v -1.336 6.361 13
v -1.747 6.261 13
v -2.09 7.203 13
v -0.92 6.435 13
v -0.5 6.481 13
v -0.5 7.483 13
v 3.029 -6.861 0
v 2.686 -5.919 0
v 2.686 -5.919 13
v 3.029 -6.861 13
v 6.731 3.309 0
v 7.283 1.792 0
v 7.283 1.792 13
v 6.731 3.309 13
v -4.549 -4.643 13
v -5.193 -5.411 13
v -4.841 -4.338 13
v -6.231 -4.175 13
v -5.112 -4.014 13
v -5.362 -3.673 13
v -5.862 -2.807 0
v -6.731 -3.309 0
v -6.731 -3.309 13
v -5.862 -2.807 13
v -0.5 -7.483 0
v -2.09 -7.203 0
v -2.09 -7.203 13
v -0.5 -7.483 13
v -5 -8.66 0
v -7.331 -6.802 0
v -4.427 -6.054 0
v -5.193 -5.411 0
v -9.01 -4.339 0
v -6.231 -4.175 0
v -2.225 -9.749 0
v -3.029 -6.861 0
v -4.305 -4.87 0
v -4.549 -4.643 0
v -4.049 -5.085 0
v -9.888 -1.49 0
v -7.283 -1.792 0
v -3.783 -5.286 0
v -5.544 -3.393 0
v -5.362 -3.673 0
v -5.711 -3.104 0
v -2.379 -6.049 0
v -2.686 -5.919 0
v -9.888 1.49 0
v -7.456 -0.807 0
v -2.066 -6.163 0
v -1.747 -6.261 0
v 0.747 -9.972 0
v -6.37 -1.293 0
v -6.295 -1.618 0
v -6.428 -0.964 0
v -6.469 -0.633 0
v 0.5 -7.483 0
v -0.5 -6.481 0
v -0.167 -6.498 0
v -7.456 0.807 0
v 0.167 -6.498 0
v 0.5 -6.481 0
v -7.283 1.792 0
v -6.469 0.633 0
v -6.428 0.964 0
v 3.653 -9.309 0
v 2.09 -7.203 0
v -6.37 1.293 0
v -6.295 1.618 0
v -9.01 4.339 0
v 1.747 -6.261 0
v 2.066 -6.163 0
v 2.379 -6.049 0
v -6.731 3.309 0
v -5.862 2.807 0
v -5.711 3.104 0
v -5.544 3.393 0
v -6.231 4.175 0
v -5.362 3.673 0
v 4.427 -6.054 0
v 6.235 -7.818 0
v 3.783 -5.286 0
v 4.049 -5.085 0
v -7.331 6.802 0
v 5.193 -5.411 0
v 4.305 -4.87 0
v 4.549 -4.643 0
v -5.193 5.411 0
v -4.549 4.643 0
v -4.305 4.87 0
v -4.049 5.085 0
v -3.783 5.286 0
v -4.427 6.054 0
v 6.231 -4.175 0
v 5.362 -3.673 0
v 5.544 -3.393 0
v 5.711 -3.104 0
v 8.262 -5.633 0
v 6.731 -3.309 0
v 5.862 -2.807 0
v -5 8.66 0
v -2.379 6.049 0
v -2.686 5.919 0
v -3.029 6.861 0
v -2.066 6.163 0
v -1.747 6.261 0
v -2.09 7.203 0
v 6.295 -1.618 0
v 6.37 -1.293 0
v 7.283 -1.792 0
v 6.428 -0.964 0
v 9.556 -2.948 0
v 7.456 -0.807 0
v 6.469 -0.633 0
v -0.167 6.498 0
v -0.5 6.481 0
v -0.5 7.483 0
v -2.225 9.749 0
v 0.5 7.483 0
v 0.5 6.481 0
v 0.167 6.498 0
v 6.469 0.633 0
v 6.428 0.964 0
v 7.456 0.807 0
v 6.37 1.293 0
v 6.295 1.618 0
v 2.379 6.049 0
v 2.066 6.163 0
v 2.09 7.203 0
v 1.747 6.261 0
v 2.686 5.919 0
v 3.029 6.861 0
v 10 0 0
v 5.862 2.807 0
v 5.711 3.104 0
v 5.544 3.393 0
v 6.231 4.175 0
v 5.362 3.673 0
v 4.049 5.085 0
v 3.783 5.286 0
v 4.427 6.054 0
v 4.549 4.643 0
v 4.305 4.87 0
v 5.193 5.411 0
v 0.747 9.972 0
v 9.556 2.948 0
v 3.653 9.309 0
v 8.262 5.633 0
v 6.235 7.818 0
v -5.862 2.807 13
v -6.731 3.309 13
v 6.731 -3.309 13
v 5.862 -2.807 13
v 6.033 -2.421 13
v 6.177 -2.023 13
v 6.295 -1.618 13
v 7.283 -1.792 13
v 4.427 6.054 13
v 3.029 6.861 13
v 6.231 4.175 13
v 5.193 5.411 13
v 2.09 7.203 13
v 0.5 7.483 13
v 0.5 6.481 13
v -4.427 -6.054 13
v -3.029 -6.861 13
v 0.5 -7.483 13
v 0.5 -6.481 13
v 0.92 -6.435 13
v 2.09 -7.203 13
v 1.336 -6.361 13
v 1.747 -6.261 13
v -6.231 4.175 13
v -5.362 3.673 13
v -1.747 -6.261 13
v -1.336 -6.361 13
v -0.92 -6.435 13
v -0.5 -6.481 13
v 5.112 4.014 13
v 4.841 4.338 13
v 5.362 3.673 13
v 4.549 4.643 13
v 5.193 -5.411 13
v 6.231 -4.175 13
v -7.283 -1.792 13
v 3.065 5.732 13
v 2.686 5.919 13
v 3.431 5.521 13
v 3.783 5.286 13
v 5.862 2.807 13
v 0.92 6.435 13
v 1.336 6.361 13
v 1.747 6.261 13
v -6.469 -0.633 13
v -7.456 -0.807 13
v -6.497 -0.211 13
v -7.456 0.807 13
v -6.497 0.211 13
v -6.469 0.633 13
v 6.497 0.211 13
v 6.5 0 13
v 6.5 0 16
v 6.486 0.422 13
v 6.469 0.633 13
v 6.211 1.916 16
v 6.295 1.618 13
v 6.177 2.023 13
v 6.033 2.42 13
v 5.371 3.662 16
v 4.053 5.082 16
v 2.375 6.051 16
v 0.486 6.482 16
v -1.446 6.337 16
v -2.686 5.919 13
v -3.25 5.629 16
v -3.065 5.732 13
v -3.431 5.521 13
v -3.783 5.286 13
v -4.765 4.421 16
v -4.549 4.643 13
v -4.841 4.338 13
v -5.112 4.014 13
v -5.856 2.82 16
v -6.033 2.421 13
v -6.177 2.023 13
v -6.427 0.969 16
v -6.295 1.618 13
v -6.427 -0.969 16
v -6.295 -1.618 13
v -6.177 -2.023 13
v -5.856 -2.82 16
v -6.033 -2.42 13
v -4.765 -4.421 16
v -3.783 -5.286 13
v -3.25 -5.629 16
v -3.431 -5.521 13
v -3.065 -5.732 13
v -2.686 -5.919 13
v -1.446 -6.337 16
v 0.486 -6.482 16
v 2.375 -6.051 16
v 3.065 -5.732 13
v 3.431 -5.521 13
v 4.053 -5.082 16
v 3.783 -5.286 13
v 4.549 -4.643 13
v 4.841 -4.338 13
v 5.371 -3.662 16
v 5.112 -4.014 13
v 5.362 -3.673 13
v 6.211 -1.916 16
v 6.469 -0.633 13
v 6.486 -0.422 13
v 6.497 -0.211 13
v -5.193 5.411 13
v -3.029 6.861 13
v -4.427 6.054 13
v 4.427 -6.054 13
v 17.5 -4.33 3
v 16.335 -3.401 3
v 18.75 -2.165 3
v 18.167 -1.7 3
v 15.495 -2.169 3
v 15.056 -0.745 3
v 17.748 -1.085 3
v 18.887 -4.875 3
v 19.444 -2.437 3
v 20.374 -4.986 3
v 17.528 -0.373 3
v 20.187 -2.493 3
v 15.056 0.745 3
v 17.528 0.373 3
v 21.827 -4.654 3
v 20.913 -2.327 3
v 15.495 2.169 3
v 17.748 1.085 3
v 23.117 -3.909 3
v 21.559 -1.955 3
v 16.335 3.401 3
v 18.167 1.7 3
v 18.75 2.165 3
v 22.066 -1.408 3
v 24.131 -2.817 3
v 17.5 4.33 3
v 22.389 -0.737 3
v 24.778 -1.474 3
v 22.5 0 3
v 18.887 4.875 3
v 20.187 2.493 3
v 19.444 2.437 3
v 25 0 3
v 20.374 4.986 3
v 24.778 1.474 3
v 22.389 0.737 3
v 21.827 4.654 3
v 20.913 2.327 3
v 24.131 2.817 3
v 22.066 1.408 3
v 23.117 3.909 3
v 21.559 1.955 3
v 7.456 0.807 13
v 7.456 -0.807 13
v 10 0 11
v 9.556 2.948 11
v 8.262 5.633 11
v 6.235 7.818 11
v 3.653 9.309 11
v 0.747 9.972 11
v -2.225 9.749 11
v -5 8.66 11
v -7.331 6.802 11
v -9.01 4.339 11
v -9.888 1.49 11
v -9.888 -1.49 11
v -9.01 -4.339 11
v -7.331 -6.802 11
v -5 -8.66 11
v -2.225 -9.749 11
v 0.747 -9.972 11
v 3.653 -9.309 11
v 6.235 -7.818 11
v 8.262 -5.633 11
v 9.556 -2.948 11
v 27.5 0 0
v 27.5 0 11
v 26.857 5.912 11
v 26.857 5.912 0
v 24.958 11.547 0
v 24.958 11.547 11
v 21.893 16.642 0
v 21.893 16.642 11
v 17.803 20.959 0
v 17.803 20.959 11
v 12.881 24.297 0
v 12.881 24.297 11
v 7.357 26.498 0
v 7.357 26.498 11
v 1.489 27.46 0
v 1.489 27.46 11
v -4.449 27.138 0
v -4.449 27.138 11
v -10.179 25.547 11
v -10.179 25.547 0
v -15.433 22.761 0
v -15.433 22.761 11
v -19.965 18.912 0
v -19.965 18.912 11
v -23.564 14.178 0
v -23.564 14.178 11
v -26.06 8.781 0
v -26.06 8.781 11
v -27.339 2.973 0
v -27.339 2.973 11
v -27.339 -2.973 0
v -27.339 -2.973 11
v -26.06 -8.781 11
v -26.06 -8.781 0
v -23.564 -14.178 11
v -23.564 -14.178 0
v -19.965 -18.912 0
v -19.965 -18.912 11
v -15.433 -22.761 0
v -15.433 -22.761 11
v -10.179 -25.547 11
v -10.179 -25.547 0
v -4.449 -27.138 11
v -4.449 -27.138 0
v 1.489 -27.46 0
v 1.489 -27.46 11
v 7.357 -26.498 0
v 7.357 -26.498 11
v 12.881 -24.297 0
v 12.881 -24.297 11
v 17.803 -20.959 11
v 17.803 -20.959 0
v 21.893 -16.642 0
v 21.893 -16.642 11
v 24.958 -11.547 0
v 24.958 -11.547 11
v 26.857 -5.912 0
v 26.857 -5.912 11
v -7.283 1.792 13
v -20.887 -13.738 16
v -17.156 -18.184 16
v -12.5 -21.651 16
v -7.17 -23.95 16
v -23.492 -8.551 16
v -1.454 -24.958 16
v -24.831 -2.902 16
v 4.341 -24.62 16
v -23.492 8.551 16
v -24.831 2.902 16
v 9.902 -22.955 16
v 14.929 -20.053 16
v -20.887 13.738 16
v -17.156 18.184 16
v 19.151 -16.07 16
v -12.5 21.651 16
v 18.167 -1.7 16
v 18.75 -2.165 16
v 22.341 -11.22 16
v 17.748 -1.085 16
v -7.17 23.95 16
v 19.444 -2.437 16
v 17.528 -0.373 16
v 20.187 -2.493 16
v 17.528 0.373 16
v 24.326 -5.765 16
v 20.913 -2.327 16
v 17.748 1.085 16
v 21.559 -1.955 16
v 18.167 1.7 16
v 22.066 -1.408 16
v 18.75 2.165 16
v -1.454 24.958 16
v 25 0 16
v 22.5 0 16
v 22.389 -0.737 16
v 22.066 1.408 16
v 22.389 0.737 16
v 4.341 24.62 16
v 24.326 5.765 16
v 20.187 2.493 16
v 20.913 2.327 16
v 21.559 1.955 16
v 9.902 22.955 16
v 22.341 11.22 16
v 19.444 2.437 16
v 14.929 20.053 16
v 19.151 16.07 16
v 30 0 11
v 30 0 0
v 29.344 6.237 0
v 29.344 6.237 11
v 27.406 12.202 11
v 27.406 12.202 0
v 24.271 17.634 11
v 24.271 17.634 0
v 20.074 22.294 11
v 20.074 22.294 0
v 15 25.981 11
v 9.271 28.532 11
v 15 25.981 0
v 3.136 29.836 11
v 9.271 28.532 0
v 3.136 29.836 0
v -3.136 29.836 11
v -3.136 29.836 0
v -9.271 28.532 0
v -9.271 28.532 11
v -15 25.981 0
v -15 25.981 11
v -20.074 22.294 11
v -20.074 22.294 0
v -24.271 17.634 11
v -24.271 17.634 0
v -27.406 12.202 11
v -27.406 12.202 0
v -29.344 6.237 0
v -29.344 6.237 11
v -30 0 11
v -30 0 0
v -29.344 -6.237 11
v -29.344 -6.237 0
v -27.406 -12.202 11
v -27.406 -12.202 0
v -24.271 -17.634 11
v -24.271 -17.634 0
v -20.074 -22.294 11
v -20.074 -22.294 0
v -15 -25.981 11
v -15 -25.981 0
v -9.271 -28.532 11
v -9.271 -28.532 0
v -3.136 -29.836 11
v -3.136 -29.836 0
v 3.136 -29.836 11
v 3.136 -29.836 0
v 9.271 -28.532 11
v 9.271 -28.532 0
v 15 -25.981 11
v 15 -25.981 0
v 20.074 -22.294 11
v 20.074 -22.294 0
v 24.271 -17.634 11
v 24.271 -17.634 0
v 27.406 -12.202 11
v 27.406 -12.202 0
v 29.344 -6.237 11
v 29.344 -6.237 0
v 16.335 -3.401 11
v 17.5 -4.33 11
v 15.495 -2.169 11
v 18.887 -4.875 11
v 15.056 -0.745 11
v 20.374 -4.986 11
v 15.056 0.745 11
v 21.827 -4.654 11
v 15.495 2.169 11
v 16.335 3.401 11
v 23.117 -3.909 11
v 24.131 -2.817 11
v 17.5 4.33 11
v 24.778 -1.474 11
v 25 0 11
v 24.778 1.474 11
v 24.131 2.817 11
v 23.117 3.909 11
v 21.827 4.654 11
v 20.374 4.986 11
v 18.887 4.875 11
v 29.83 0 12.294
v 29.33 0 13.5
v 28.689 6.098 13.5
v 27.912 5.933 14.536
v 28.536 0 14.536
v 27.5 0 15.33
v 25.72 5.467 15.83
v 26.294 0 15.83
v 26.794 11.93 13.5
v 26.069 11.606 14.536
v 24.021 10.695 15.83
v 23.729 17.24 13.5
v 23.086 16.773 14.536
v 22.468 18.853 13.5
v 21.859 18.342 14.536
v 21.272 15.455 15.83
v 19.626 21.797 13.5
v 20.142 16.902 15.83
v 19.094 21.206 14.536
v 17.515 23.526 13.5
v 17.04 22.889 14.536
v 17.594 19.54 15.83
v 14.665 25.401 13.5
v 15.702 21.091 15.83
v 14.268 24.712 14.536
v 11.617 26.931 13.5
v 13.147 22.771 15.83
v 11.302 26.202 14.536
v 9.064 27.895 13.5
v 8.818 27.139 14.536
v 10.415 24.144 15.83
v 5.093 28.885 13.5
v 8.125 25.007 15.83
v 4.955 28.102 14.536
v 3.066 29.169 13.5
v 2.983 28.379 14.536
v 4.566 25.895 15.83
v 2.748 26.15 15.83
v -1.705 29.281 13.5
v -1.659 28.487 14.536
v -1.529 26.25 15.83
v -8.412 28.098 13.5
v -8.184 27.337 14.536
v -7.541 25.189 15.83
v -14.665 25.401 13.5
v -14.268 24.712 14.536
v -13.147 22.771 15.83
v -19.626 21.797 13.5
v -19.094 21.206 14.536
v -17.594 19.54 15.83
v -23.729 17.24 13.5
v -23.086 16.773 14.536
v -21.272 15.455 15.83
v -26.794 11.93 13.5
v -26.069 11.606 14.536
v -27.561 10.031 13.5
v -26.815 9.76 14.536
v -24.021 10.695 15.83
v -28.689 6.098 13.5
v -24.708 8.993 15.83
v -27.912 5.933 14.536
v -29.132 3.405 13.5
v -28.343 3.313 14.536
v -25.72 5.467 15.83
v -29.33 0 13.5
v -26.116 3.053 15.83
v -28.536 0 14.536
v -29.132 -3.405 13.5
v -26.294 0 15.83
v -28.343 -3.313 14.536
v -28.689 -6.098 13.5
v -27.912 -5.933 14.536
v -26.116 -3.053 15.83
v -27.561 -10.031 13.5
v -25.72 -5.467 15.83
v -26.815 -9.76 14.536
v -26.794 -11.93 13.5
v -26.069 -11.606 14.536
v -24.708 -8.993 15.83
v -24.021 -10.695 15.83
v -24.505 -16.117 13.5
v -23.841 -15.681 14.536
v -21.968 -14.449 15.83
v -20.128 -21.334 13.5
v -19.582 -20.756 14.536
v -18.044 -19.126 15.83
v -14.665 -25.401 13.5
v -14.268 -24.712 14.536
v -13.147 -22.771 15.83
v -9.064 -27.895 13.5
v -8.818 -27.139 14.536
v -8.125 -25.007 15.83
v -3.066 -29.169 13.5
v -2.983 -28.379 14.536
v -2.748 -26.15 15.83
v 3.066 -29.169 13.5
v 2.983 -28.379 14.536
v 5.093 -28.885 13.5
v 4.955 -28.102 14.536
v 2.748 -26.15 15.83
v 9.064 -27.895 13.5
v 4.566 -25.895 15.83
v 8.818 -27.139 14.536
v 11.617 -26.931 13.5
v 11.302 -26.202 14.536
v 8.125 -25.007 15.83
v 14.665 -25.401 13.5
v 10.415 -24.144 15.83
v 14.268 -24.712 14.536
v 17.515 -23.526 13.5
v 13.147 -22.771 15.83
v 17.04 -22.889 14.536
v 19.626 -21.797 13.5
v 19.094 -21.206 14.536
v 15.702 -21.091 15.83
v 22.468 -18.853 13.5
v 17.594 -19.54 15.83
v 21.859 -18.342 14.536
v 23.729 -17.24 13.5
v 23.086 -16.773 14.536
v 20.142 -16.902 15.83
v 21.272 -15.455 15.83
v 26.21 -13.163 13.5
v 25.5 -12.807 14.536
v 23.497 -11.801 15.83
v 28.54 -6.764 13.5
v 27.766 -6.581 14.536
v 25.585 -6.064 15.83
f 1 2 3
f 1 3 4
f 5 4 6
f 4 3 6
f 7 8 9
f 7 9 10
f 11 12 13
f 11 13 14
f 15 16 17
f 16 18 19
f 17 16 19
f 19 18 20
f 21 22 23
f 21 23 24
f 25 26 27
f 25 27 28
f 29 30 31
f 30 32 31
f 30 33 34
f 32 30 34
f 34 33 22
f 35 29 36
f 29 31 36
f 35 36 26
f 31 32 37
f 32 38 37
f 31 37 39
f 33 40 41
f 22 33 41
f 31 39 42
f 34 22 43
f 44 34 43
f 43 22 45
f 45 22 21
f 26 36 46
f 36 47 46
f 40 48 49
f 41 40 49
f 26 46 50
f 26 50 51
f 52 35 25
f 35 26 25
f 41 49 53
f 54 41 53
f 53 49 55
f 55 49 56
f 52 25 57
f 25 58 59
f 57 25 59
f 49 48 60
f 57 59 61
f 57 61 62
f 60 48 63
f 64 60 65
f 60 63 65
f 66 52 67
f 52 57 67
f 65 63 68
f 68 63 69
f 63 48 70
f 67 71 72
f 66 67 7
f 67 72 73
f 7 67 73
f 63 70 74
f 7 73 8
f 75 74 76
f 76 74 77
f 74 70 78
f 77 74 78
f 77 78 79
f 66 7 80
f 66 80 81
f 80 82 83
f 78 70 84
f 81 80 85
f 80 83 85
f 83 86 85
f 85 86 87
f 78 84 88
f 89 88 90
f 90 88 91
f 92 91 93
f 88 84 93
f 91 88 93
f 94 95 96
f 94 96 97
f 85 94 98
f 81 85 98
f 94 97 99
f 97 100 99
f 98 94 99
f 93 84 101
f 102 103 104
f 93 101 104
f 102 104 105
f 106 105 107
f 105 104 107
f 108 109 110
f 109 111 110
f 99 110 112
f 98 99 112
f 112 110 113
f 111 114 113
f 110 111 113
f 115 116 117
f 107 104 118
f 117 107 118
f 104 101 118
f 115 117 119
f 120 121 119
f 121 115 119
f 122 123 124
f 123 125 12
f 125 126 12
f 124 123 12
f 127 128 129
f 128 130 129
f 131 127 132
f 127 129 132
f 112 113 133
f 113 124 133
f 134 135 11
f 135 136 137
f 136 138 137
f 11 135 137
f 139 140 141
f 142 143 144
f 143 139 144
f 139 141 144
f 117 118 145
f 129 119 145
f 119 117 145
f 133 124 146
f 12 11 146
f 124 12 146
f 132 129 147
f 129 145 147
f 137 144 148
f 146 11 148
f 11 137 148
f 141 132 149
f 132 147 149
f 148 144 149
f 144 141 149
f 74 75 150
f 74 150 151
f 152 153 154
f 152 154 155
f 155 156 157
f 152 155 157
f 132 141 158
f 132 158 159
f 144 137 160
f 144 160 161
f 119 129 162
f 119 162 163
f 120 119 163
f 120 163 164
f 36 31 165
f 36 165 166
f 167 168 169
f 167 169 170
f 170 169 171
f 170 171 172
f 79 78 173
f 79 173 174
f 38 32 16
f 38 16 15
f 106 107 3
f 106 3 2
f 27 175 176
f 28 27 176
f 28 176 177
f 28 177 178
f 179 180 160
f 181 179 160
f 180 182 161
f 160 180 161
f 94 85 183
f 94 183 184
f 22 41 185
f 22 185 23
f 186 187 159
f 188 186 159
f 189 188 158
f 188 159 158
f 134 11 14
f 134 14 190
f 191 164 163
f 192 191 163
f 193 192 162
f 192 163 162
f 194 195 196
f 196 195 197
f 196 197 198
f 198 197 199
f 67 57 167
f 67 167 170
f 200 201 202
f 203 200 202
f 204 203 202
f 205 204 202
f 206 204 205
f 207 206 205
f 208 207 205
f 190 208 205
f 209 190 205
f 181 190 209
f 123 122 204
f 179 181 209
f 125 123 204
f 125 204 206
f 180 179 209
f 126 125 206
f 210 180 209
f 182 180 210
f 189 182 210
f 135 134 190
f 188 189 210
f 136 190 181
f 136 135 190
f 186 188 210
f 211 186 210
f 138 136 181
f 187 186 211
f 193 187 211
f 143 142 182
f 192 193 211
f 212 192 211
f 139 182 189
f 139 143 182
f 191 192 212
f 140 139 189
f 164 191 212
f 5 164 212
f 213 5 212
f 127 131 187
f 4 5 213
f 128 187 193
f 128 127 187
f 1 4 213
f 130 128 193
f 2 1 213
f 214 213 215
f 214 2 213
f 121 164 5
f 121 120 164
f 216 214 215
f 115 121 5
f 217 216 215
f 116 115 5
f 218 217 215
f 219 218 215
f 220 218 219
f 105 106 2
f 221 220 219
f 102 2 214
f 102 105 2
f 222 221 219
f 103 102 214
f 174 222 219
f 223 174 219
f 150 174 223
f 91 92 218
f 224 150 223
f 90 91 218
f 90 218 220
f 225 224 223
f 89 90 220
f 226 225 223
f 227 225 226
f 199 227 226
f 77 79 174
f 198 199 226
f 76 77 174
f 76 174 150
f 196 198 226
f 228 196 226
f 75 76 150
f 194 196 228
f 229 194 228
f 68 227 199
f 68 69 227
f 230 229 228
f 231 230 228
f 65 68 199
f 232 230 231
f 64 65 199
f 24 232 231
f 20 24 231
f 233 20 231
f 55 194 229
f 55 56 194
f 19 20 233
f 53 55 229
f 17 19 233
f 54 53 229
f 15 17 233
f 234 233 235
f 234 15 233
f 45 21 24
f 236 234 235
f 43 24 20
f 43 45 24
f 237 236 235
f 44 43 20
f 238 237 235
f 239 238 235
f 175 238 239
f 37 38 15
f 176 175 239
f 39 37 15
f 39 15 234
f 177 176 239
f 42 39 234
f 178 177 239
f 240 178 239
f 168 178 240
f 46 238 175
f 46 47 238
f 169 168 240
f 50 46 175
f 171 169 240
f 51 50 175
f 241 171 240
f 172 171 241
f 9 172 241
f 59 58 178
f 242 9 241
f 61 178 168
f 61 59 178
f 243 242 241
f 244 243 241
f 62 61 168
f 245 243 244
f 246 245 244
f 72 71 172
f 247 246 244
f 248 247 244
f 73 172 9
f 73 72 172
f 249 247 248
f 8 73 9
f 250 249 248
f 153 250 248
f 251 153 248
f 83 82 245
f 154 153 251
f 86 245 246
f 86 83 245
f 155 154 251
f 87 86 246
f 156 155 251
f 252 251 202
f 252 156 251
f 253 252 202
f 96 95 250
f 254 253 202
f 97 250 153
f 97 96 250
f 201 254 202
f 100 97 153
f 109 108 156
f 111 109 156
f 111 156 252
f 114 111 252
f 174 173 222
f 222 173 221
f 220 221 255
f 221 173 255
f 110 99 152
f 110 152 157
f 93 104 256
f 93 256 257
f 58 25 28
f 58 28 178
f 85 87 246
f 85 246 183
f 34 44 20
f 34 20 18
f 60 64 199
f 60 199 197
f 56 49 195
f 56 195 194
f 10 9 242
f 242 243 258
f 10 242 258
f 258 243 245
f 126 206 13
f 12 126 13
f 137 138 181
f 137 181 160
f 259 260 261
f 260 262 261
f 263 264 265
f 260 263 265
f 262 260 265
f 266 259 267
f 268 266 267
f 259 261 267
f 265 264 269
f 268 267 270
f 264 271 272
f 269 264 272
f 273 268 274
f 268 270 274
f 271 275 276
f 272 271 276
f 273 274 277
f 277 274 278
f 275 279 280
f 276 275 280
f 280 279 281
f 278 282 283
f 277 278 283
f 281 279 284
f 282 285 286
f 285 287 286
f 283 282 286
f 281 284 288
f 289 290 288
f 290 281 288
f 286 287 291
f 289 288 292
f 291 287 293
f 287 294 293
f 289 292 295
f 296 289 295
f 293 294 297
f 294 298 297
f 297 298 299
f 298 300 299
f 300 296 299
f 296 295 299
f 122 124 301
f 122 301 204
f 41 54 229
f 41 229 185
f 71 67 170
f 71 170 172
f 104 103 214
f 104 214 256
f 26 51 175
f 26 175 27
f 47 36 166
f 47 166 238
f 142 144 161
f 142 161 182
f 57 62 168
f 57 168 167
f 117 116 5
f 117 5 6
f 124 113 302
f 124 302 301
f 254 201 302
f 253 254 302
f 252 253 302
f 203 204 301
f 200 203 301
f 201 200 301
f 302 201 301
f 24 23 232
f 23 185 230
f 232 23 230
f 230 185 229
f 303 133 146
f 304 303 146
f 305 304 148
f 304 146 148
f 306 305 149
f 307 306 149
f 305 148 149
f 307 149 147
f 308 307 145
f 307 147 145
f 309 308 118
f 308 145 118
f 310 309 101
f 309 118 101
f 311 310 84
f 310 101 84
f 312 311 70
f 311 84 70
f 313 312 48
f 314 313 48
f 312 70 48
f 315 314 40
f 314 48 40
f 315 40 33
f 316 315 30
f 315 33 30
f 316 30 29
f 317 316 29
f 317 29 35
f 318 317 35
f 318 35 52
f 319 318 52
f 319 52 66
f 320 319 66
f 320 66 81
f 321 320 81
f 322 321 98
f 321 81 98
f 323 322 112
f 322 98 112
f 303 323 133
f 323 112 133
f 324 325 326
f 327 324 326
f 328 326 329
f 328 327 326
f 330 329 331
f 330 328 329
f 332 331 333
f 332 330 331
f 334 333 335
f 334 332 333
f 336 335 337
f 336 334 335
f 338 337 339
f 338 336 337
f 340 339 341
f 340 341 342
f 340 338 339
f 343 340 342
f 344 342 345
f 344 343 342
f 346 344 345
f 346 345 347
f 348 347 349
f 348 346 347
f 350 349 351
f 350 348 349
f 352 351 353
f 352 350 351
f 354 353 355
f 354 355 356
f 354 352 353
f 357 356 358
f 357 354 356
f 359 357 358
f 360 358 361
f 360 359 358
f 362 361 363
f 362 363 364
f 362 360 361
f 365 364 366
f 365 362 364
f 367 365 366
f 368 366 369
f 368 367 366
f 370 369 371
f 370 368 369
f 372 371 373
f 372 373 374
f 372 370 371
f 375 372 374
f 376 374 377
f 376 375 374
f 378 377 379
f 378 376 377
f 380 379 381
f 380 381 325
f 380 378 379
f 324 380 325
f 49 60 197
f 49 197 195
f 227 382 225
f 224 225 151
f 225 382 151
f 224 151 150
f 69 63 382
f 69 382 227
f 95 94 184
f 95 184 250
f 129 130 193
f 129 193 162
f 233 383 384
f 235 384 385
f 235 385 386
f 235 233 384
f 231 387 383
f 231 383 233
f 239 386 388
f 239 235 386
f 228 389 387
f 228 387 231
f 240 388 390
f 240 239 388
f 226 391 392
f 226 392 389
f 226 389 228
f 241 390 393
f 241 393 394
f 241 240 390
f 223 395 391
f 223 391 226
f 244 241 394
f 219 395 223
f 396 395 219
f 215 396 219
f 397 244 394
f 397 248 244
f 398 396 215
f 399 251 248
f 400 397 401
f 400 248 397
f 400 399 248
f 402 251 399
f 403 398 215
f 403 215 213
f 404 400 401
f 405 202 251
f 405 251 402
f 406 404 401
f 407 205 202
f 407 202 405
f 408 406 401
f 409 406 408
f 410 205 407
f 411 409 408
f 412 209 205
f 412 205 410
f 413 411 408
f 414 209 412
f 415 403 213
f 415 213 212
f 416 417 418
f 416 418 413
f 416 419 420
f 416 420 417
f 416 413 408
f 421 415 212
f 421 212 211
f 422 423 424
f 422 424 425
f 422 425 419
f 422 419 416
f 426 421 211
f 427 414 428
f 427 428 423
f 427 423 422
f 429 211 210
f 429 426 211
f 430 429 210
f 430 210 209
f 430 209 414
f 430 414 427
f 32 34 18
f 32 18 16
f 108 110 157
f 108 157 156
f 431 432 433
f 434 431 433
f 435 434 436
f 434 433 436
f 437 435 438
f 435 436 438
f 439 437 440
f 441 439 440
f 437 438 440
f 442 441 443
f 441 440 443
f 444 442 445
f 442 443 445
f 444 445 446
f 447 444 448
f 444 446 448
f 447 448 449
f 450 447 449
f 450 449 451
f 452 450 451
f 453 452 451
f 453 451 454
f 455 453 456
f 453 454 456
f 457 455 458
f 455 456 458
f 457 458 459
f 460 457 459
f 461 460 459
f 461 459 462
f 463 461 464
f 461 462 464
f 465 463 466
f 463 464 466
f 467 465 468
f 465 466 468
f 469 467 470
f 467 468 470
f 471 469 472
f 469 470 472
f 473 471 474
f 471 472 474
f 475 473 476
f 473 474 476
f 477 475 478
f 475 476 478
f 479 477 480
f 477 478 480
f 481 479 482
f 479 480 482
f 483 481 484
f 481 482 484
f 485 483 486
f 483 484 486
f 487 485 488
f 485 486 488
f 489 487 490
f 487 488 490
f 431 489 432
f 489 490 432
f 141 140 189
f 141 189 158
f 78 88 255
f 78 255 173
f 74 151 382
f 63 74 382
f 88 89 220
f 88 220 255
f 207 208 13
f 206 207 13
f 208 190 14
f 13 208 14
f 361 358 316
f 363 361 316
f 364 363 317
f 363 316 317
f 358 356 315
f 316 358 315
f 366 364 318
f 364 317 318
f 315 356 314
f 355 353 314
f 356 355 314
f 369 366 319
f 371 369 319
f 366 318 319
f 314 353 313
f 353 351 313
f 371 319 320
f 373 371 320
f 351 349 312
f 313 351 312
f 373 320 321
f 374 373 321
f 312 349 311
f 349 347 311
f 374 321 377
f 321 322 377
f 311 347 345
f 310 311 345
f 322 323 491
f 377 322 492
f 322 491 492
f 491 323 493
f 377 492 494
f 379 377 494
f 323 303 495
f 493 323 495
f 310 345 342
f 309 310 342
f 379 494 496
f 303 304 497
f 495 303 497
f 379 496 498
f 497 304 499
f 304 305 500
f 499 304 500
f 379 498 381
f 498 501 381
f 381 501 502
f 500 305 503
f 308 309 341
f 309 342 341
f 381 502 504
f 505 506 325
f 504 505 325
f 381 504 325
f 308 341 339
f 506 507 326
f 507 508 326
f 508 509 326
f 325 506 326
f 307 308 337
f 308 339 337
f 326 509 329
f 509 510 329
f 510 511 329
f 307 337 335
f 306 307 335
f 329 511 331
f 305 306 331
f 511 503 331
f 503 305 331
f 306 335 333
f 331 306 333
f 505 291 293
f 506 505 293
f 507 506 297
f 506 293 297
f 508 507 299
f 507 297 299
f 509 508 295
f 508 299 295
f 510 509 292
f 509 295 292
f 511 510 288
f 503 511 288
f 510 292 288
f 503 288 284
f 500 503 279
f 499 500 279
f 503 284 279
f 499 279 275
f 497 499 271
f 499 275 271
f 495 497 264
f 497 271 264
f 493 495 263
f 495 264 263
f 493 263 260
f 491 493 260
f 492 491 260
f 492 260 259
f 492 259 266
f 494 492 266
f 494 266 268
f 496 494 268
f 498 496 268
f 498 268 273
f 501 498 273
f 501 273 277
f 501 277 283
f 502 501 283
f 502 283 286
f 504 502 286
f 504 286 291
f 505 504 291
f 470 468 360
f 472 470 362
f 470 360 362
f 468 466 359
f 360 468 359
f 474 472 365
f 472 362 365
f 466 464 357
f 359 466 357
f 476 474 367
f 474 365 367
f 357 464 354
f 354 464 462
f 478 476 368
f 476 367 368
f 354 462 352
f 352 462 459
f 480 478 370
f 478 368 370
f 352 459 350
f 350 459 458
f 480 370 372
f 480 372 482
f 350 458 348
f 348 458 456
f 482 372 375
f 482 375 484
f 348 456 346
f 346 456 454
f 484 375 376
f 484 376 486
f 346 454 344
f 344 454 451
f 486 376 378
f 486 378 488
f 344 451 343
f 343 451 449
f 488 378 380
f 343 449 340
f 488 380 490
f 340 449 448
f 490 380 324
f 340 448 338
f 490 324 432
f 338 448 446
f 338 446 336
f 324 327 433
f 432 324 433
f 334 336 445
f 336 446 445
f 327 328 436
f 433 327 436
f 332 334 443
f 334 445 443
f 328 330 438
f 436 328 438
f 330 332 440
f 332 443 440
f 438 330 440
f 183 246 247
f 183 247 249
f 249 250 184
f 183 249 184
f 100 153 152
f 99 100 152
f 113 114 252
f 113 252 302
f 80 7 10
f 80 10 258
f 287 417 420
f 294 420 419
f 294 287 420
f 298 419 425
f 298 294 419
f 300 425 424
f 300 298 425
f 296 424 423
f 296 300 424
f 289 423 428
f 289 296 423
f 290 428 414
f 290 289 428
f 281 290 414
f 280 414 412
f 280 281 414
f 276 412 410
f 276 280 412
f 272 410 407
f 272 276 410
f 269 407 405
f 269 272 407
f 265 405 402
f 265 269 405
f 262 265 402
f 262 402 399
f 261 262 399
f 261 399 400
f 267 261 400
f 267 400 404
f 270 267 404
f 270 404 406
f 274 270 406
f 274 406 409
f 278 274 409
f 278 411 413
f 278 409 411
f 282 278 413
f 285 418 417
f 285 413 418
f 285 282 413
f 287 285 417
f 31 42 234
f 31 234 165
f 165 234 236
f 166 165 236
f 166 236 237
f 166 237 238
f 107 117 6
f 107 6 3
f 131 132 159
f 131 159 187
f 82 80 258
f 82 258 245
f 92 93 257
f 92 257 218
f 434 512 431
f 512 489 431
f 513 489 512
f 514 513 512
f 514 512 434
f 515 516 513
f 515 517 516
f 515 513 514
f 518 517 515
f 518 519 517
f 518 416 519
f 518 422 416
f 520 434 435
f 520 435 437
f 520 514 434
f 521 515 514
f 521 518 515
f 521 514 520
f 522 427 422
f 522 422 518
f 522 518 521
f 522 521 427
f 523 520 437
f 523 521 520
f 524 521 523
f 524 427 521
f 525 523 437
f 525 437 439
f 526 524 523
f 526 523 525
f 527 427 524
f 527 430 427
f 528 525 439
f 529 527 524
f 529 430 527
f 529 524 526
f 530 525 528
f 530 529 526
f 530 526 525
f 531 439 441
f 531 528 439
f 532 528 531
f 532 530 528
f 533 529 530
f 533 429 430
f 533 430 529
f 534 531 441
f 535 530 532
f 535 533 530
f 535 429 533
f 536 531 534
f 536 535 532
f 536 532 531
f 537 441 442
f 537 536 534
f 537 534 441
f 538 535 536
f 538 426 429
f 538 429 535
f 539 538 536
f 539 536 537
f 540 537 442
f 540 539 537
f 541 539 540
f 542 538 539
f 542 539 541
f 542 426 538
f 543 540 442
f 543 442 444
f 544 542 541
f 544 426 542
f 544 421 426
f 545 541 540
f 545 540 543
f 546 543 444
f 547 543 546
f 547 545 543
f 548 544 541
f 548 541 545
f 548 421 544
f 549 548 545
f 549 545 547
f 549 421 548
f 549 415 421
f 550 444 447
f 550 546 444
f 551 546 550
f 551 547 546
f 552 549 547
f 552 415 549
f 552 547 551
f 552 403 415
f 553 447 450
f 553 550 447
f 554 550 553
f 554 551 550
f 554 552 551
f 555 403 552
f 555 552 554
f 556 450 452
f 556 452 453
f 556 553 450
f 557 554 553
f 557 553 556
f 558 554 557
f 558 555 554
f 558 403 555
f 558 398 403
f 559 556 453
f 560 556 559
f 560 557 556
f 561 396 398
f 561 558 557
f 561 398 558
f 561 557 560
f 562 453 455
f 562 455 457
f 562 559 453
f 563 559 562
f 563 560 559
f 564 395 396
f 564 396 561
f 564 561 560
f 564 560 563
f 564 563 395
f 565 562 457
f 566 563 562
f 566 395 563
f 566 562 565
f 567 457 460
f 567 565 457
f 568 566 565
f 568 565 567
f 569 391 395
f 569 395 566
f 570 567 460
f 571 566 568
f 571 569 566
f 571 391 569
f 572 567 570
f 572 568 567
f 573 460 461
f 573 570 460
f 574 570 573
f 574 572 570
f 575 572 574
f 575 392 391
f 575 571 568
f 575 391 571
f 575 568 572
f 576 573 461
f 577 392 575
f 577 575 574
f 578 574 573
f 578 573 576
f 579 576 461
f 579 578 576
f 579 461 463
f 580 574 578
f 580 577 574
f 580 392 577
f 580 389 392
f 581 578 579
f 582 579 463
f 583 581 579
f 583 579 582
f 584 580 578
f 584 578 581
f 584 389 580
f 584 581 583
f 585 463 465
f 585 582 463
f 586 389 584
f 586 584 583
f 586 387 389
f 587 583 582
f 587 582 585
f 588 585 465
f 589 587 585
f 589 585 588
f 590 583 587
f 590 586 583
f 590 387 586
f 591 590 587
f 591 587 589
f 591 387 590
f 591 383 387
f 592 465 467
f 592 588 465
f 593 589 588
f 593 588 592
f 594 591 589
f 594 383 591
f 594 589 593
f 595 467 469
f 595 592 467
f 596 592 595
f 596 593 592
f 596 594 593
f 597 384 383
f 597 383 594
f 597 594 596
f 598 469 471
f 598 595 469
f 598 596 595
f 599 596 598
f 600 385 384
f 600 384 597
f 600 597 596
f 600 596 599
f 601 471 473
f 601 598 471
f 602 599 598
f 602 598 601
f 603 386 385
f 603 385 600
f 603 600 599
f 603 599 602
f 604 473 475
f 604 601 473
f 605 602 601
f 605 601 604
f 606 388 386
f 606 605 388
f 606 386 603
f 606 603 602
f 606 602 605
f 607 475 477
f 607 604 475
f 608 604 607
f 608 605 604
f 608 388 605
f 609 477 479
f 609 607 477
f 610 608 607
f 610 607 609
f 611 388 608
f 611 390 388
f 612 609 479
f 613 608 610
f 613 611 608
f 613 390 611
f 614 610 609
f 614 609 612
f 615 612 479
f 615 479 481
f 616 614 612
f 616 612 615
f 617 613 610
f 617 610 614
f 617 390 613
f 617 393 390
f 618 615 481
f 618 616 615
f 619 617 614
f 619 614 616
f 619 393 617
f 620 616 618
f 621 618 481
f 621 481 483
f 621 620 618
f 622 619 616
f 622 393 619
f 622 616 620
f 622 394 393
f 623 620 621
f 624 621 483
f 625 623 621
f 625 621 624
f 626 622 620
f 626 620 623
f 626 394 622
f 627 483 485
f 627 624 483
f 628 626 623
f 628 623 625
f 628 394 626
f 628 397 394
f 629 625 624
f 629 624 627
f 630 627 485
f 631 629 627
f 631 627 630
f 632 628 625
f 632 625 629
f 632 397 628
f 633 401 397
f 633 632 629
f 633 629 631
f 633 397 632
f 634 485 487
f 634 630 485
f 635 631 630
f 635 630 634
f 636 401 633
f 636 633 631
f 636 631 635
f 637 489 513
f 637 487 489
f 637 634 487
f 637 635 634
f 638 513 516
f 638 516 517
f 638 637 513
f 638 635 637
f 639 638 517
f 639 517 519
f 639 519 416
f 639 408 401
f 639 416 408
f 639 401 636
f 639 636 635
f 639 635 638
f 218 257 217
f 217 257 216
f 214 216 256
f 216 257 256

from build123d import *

# Parameters (mm, degrees)
F1_R      = 30
F2_DEPTH  = 16
F3_DEPTH  = 13
F4_R      = 6.5
F5_DEPTH  = 16.001
F6_R      = 2.5
F7_DEPTH  = 16.001
F8_R      = 5
F9_R      = 27.5
F9_R_2    = 10
F9_R_3    = 5
F10_DEPTH = 11
F11_DEPTH = 3


with BuildPart() as f2:
    # F1 (on Top) → F2 (new body)
    with BuildSketch(Plane.XY):
        Circle(F1_R)
    extrude(amount=F2_DEPTH)

    # F0 (on Top) → F3 (cut)
    with BuildSketch(Plane.XY):
        Polygon((0.5, 7.4833147735), (0.5, 6.4807406984), (-0.5, 6.4807406984), (-0.5, 7.4833147735), (-2.0895980578, 7.2030257501), (-1.746697532, 6.2609142888), (-2.6863901539, 5.9188941485), (-3.0292906797, 6.8610056098), (-4.4271597759, 6.0539455166), (-3.782717585, 5.2859292156), (-4.54876203, 4.6431416082), (-5.193204221, 5.4111579093), (-6.2307406865, 4.1746701064), (-5.3624860697, 3.6733830663), (-5.8624860722, 2.807357664), (-6.730740689, 3.308644704), (-7.2828023136, 1.7918678691), (-6.2954595919, 1.6177727054), (-6.4691077722, 0.6329649529), (-7.4564504939, 0.8070601166), (-7.456450498, -0.8070600785), (-6.4691077754, -0.6329649198), (-6.2954596002, -1.6177726732), (-7.2828023228, -1.7918678319), (-6.7307407059, -3.3086446696), (-5.8624860865, -2.807357634), (-5.3624860885, -3.6733830389), (-6.2307407079, -4.1746700745), (-5.1932042487, -5.4111578827), (-4.5487620538, -4.643141585), (-3.782717612, -5.2859291963), (-4.4271598069, -6.053945494), (-3.0292907148, -6.8610055943), (-2.6863901841, -5.9188941348), (-1.746697564, -6.2609142799), (-2.0895980946, -7.2030257394), (-0.5000000128, -7.4833147727), (-0.500000011, -6.4807406976), (0.499999989, -6.4807406993), (0.4999999872, -7.4833147744), (2.0895980701, -7.2030257465), (1.7466975426, -6.2609142858), (2.686390164, -5.9188941439), (3.0292906914, -6.8610056046), (4.4271597862, -6.0539455091), (3.782717594, -5.2859292092), (4.5487620379, -4.6431416005), (5.1932042302, -5.4111579004), (6.2307406937, -4.1746700957), (5.362486076, -3.6733830572), (5.862486077, -2.807357654), (6.7307406946, -3.3086446925), (7.2828023167, -1.7918678567), (6.2954595947, -1.6177726947), (6.4691077733, -0.6329649418), (7.4564504953, -0.8070601039), (7.4564504967, 0.8070600912), (6.4691077744, 0.6329649308), (6.2954595974, 1.6177726839), (7.2828023197, 1.7918678443), (6.7307407003, 3.3086446811), (5.8624860818, 2.807357644), (5.3624860822, 3.673383048), (6.2307407008, 4.1746700851), (5.1932042394, 5.4111578916), (4.5487620458, 4.6431415927), (3.782717603, 5.2859292027), (4.4271597966, 6.0539455016), (3.0292907031, 6.8610055995), (2.686390174, 5.9188941393), (1.7466975533, 6.2609142829), (2.0895980824, 7.203025743), align=None)
    extrude(amount=F3_DEPTH, mode=Mode.SUBTRACT)

    # F4 (on Top) → F5 (cut, through all)
    with BuildSketch(Plane.XY):
        Circle(F4_R)
    extrude(amount=F5_DEPTH, mode=Mode.SUBTRACT)

    # F6 (on Top) → F7 (cut, through all)
    with BuildSketch(Plane.XY):
        with Locations((20, 0)):
            Circle(F6_R)
    extrude(amount=F7_DEPTH, mode=Mode.SUBTRACT)

    # F8
    f8_edges = [f2.edges().sort_by_distance(p)[0] for p in [
        (-30, 0, 16),
    ]]
    fillet(f8_edges, radius=F8_R)

    # F9 (on Top) → F10 (cut)
    with BuildSketch(Plane.XY):
        Circle(F9_R)
        Circle(F9_R_2, mode=Mode.SUBTRACT)
        with Locations((20, 0)):
            Circle(F9_R_3, mode=Mode.SUBTRACT)
    extrude(amount=F10_DEPTH, mode=Mode.SUBTRACT)

    # F11 (cut): a face of the model
    f11_faces = [f2.faces().sort_by_distance(p)[0] for p in [
        (15.1414213562, 0, 0),
    ]]
    extrude(f11_faces, amount=-F11_DEPTH, mode=Mode.SUBTRACT)


solid = f2.part
